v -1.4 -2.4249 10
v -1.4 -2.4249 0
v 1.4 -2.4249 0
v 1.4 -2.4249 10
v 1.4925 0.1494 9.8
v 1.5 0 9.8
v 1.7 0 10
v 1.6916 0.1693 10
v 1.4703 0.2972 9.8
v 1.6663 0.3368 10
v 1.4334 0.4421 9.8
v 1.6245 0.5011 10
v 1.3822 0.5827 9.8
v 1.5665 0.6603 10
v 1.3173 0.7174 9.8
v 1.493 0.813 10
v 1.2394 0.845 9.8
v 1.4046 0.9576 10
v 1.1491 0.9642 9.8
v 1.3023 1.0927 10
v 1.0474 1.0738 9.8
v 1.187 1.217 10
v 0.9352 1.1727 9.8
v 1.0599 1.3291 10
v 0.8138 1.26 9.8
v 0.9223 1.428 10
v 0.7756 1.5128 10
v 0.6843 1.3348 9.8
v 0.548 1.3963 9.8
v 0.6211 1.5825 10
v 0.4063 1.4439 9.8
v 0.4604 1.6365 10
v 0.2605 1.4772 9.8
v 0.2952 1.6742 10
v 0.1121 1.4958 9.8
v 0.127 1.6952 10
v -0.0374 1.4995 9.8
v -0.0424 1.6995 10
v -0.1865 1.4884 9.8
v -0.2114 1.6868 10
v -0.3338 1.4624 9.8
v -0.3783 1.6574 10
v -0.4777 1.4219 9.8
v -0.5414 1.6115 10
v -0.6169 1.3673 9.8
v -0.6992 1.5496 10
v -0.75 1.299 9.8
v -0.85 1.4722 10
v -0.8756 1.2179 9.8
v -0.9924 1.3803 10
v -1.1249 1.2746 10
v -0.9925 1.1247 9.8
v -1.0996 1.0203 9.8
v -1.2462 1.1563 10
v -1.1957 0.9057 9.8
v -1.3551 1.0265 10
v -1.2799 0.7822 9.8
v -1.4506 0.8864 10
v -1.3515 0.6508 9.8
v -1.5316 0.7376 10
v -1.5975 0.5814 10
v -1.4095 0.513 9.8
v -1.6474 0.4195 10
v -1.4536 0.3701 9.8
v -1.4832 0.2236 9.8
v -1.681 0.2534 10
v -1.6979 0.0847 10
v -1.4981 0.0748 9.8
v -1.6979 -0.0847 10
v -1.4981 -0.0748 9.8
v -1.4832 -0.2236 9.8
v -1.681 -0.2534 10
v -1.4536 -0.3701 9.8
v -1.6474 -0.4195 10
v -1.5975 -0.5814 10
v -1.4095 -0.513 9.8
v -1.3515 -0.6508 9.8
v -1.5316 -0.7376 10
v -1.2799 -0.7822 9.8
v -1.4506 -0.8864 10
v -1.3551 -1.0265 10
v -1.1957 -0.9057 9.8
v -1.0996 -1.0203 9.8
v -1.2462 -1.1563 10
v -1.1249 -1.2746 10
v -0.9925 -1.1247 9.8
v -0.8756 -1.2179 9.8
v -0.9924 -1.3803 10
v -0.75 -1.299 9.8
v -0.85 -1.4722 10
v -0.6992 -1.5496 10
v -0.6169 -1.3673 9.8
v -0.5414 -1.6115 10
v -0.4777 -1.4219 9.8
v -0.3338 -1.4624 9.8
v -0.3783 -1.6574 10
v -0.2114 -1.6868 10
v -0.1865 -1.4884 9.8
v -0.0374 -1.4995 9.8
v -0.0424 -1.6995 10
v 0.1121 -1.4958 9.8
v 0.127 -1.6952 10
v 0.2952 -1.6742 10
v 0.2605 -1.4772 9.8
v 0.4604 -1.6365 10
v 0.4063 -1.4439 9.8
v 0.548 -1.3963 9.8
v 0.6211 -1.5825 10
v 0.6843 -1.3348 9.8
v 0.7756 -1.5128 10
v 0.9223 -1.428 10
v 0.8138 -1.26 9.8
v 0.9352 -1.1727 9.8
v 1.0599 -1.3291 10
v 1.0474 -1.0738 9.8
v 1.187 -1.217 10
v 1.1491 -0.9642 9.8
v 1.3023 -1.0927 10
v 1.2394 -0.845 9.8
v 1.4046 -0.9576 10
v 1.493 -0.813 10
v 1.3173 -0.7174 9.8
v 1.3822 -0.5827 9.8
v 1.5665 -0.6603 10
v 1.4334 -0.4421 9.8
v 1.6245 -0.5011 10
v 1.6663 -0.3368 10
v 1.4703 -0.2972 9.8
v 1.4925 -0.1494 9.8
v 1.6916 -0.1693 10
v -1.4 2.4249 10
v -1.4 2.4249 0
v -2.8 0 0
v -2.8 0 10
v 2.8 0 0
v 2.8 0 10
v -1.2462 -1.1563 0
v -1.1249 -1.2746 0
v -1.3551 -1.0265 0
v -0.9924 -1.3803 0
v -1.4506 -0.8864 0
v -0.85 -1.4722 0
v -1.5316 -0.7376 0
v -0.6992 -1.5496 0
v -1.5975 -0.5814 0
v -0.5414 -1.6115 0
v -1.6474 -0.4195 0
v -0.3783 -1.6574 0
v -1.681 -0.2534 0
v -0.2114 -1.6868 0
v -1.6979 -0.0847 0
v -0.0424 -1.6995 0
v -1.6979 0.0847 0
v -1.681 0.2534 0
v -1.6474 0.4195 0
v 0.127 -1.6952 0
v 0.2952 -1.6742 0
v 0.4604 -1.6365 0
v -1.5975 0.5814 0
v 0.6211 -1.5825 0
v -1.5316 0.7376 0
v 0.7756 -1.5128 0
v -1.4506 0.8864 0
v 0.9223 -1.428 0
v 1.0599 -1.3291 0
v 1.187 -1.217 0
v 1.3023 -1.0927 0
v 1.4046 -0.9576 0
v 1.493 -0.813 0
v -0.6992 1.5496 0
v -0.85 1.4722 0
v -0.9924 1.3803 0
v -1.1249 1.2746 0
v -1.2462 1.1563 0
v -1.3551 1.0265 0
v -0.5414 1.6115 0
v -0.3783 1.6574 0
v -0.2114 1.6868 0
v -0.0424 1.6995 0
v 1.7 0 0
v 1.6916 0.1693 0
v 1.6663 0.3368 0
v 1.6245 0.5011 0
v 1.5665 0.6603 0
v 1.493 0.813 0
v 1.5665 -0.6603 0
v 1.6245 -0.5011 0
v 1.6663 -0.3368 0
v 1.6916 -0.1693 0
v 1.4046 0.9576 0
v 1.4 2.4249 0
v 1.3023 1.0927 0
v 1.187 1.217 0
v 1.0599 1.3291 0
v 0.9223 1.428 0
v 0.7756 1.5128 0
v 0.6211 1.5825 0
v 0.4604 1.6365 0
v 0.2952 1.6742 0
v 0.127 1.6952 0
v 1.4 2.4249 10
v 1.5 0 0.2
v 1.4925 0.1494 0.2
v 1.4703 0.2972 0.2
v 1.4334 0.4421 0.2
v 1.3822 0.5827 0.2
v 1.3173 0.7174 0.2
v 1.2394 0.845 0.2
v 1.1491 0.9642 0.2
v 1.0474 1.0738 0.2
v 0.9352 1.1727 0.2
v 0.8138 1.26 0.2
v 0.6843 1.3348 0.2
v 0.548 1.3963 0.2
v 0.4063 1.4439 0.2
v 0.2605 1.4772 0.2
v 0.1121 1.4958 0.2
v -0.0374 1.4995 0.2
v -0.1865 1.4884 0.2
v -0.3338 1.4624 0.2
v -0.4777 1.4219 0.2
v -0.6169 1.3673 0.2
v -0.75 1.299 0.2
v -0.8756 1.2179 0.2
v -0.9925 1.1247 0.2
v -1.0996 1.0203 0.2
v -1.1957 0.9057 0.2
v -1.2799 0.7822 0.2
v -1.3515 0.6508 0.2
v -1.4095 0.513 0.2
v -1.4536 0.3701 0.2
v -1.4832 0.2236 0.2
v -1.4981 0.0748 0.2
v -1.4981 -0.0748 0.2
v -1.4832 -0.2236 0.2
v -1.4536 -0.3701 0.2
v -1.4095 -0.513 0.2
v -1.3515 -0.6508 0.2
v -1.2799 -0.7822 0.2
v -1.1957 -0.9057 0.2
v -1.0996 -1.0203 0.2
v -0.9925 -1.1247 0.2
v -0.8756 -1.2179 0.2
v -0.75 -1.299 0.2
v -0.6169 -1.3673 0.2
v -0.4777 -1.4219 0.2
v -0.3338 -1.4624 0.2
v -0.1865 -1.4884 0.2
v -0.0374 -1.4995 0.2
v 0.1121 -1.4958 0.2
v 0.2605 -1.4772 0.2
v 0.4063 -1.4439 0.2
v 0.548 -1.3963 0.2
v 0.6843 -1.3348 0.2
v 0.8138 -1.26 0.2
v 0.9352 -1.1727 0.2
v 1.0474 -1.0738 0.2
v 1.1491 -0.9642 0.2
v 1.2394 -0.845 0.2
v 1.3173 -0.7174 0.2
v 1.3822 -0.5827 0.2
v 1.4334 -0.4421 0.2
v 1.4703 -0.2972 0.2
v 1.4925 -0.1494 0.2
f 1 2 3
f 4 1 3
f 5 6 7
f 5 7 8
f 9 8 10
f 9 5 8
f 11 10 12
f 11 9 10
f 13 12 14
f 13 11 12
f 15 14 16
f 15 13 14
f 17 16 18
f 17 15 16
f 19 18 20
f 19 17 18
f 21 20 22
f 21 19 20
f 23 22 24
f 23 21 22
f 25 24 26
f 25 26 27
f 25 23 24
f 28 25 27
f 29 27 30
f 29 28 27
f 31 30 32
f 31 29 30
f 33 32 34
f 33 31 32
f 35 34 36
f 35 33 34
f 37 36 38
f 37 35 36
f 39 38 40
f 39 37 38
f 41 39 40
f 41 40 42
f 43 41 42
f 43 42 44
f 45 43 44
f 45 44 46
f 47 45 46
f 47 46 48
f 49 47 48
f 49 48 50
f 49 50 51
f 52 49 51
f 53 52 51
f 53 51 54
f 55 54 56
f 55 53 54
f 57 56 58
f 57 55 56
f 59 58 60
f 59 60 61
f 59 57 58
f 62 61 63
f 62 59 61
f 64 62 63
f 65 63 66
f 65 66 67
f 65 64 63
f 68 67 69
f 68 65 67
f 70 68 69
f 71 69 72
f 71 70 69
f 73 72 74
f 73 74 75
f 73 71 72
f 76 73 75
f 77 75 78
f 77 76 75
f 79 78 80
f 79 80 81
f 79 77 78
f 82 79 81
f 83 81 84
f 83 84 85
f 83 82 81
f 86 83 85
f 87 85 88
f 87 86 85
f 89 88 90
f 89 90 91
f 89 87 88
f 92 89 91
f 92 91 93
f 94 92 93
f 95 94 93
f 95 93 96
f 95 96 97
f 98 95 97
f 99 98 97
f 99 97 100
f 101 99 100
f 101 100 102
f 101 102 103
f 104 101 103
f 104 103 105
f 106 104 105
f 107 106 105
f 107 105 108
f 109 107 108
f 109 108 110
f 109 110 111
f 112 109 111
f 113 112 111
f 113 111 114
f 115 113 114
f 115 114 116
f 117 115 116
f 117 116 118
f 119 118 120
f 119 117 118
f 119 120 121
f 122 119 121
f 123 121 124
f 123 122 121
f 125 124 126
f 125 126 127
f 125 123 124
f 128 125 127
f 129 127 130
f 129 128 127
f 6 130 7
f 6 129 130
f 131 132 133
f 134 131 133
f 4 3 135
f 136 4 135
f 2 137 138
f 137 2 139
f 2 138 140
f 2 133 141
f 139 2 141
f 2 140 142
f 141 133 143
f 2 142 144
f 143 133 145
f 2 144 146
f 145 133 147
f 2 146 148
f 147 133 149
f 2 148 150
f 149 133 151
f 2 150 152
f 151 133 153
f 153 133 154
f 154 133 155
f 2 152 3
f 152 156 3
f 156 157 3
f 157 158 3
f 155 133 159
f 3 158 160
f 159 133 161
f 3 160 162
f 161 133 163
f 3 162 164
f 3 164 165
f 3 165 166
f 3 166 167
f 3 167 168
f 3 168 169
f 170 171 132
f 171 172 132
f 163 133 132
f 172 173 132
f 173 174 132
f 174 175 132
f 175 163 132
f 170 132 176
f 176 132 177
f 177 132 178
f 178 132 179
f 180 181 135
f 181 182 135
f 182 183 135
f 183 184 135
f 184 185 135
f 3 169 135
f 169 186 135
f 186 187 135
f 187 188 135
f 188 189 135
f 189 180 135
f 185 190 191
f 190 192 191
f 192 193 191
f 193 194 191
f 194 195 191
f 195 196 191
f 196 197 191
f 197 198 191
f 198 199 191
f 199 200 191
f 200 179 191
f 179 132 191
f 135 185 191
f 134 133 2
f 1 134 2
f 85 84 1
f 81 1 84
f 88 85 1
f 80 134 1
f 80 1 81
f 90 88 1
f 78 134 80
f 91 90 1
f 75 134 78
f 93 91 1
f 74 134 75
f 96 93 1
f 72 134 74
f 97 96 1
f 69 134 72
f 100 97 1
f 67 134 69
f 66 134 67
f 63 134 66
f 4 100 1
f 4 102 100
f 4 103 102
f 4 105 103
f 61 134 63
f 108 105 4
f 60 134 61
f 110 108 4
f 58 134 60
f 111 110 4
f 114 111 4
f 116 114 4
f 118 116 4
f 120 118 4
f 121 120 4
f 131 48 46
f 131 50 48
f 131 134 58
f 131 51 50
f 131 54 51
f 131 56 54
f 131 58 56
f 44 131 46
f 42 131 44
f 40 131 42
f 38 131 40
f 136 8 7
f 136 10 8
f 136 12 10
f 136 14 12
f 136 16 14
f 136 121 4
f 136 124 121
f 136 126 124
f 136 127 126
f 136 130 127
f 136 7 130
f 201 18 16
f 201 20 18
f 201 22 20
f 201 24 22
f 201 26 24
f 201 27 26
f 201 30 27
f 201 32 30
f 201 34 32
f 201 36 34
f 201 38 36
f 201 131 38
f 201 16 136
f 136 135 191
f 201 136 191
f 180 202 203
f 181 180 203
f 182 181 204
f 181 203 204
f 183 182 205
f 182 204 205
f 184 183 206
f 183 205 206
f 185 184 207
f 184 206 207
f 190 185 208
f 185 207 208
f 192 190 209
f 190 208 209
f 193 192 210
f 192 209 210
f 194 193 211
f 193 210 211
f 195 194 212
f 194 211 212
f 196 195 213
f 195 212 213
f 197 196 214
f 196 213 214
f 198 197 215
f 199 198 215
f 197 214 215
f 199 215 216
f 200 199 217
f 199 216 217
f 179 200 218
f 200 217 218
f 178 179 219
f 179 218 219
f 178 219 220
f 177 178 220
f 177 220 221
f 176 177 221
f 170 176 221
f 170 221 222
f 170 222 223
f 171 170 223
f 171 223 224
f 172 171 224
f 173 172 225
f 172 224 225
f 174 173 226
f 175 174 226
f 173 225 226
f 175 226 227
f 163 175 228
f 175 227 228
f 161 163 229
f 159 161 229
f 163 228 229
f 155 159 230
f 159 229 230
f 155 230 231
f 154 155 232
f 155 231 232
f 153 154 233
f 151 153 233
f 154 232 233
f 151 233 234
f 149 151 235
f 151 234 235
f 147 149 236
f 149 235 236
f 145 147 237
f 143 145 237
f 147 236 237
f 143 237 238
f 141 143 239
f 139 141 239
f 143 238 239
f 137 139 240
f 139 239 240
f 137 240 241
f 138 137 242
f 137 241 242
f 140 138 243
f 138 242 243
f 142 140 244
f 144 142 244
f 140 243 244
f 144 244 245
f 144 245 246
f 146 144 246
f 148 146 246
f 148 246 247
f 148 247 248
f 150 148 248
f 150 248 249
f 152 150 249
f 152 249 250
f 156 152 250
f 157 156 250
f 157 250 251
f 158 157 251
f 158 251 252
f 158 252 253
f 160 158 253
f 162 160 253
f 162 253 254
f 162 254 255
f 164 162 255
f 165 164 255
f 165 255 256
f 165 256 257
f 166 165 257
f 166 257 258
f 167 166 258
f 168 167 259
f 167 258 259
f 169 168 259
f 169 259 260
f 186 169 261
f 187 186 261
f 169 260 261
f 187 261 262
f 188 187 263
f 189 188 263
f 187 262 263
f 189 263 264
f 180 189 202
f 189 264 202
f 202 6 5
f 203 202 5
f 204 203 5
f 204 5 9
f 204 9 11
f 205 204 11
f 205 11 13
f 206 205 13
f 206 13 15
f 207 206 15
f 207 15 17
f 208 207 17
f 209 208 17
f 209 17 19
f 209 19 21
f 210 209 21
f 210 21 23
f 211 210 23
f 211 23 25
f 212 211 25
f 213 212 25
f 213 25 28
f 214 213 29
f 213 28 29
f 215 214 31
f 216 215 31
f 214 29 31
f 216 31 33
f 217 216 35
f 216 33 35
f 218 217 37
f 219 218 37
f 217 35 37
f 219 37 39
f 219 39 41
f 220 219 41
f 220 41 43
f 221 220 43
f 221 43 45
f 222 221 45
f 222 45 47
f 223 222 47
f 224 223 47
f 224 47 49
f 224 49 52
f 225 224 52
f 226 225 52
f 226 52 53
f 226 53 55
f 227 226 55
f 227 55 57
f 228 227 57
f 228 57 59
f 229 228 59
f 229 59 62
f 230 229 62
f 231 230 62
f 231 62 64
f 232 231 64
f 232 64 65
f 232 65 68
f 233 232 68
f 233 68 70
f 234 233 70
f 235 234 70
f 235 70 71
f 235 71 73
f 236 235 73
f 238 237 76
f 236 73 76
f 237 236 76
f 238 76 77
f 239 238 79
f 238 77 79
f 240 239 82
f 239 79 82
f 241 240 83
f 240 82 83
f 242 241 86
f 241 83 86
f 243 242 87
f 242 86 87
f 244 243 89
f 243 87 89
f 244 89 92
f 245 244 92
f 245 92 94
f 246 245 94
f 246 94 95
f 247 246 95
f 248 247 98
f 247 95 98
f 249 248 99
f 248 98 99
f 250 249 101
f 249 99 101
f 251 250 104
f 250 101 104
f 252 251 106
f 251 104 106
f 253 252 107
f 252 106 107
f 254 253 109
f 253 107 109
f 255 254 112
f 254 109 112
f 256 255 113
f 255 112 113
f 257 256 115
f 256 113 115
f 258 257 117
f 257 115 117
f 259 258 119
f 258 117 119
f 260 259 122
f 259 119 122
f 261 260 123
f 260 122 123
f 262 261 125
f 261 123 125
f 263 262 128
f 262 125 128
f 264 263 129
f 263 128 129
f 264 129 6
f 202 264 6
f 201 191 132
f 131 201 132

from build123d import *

# Parameters (mm, degrees)
PAD_DEPTH    = 10
SKETCH001_R  = 1.5
POCKET_DEPTH = 10.001
CHAMFER_SIZE = 0.2


with BuildPart() as part:
    # Sketch → Pad (new body)
    with BuildSketch(Plane.XY):
        Polygon((2.8, 0), (1.4, 2.424871), (-1.4, 2.424871), (-2.8, 0), (-1.4, -2.424871), (1.4, -2.424871), align=None)
    extrude(amount=PAD_DEPTH)

    # Sketch001 (on Face8 of Pad) → Pocket (cut, through all)
    with BuildSketch(Plane.XY.offset(10)):
        Circle(SKETCH001_R)
    extrude(amount=-POCKET_DEPTH, mode=Mode.SUBTRACT)

    # Chamfer
    chamfer_edges = [part.edges().sort_by_distance(p)[0] for p in [
        (-1.5, 0, 10),
        (-1.5, 0, 0),
    ]]
    chamfer(chamfer_edges, length=CHAMFER_SIZE)


solid = part.part
